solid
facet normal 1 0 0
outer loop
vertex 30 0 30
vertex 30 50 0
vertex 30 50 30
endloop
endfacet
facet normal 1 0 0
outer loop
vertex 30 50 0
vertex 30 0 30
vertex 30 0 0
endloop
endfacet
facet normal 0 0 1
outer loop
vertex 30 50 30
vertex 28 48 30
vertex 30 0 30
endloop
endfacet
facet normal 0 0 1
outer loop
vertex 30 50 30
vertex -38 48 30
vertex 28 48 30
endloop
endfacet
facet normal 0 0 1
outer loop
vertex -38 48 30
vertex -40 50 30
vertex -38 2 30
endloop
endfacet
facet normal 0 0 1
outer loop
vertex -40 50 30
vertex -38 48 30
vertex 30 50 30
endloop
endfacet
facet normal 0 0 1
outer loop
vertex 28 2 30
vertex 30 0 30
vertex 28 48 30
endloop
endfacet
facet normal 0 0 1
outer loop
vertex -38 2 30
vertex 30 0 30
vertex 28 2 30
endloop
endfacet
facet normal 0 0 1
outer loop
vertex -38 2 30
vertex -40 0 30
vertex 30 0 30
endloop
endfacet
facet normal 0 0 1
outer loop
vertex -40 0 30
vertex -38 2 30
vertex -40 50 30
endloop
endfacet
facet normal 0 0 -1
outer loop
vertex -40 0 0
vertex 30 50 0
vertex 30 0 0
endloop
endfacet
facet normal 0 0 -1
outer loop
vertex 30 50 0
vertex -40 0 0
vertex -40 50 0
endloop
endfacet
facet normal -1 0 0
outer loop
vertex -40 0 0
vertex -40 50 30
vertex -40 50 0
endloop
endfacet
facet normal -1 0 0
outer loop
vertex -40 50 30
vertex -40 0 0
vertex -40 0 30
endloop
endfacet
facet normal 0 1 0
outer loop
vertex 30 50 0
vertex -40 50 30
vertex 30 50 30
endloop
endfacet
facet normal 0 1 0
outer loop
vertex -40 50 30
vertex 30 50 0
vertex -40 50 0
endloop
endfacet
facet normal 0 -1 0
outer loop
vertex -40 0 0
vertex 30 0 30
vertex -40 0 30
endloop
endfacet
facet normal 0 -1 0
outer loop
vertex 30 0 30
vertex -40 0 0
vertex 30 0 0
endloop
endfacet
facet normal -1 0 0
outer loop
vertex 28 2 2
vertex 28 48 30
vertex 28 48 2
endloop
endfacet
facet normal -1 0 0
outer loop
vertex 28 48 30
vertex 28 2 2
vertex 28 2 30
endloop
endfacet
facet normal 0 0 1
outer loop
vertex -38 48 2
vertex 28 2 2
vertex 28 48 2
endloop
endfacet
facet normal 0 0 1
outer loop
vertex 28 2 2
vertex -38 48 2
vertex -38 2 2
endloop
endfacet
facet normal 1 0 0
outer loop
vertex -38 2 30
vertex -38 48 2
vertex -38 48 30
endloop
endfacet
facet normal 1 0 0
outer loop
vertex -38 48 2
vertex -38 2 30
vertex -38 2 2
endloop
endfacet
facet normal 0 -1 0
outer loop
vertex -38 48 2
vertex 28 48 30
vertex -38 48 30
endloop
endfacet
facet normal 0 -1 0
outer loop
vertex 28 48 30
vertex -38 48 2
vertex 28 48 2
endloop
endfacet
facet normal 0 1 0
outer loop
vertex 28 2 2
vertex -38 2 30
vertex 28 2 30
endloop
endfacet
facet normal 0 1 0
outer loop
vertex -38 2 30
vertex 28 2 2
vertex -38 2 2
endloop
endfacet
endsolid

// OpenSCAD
// Two-part enclosure for small electronics board
// Part 1: Box (Left)
// Part 2: Lid (Right, printed upside down as specified)
// Prints together with a 10mm gap between them.

// --- Dimensions ---
// Box Outer Dimensions (X x Y x Z)
$box_outer_x = 70;
$box_outer_y = 50;
$box_outer_z = 30;

// Wall and Floor Thickness
$wall_thickness = 2;
$floor_thickness = 2;

// Lid Dimensions
// Plate thickness
$plate_thickness = 2;
// Lip thickness
$lip_thickness = 1.5;
// Lip height (extends above plate)
$lip_height = 4; // Note: The prompt says "4 mm tall". 
                  // If the lip is a wall, does it mean the wall is 4mm high?
                  // Or the total height of the lip structure is 4mm?
                  // Given "1.5 mm thick wall, 4 mm tall", this usually means the wall height is 4mm.
                  // However, the previous prompt said "lip on top of it... 4mm tall".
                  // Let's re-read carefully: "a rectangular lip on top of it - a 1.5 mm thick wall, 4 mm tall".
                  // This implies the wall height is 4mm.
                  // BUT, the previous code used $lip_height = 4 and $lip_thickness = 1.5.
                  // If the wall is 4mm tall, the outer dimension of the lip would be Plate + 4 = 6mm.
                  // The prompt says "whose outer size is 65.6 x 45.6 mm". This refers to the footprint.
                  // It does not specify the total height of the lip structure, just the wall height.
                  // Wait, if the wall is 4mm tall, and it sits on a 2mm plate, the total height is 6mm.
                  // Let's assume the wall height is 4mm.
                  // However, looking at the previous code's variable names, I set $lip_height = 4.
                  // If I change the logic to a frame, the height of the frame is the critical dimension.
                  // Let's assume the "4 mm tall" refers to the wall height.
                  // So the lip structure is: Plate (2mm) + Wall (4mm) = 6mm total height.
                  // The footprint is 65.6 x 45.6.
                  // The hole inside the wall needs to match the box inner dimensions.
                  // Box Inner: 66 x 46.
                  // Lip Outer: 65.6 x 45.6.
                  // This means the Lip Outer is SMALLER than the Box Inner.
                  // This confirms the Lip is a frame that slides IN.
                  // The hole inside the lip must be smaller than the Lip Outer by the wall thickness (1.5mm).
                  // Lip Inner X = 65.6 - 1.5 = 64.1.
                  // Lip Inner Y = 45.6 - 1.5 = 44.1.
                  // Box Inner X = 66.
                  // Clearance = (66 - 64.1) / 2 = 0.95mm. This is a very tight fit but valid.
                  // Wait, the prompt said "0.2 mm clearance on each side".
                  // If Box Inner = 66, and Clearance = 0.2, then Lip Inner = 65.6.
                  // If Lip Inner = 65.6 and Lip Wall = 1.5, then Lip Outer = 65.6 + 1.5 + 1.5 = 68.6.
                  // But the prompt says "whose outer size is 65.6 x 45.6 mm".
                  // There is a contradiction in the prompt's numbers if we assume standard geometry.
                  // Let's re-read: "lip on top of it - a 1.5 mm thick wall, 4 mm tall, whose outer size is 65.6 x 45.6 mm".
                  // This explicitly defines the Outer Size of the lip as 65.6 x 45.6.
                  // And the Box Outer is 70 x 50. Wall 2mm. Box Inner = 66 x 46.
                  // If Lip Outer = 65.6, then Lip Inner = 65.6 - 1.5 - 1.5 = 62.6.
                  // Clearance = (66 - 62.6) / 2 = 1.7mm.
                  // The prompt says "0.2 mm clearance".
                  // This implies the user might have meant the *Inner* size of the lip is 65.6?
                  // Or the wall is thinner?
                  // Given the explicit "outer size is 65.6", I must follow that. The "0.2mm clearance" might be an approximation or based on a different wall thickness in the user's mind, but the dimensions are explicit.
                  // I will follow the explicit dimensions: Lip Outer = 65.6 x 45.6, Wall = 1.5.
                  // This results in a clearance of ~1.7mm, which is actually quite good for a slide-in fit.
                  // The "4 mm tall" refers to the wall height.

// Re-evaluating "4 mm tall":
// If the wall is 4mm tall, the lip structure is 2mm (plate) + 4mm (wall) = 6mm high.
// The previous code used $lip_height = 4. If I use that for the wall height, the total height is 6.
// Let's stick to the explicit numbers.

$lip_outer_x = 65.6;
$lip_outer_y = 45.6;
$lip_wall_thickness = 1.5;
$lip_wall_height = 4; // The wall is 4mm tall.

// Gap between parts
$gap_between_parts = 10;

// --- Configuration ---
$fn = 64; // Smooth curves

// --- Positioning ---
// Center the whole assembly on X=0.
// Box X center: -(gap + box/2)
// Lid X center: +(gap + box/2)
// Both centered on Y=0.

$box_x_pos = -($gap_between_parts/2 + $box_outer_x/2);
$box_y_pos = 0;
$box_z_pos = 0;

$lid_x_pos = $gap_between_parts/2 + $box_outer_x/2;
$lid_y_pos = 0;
$lid_z_pos = 0;

// --- Part 1: The Box ---
translate([
    $box_x_pos, 
    $box_y_pos, 
    $box_z_pos
])
difference() {
    // Outer Block
    cube([
        $box_outer_x, 
        $box_outer_y, 
        $box_outer_z
    ]);
    
    // Cut out the inside (open top)
    // Inner dimensions:
    // X: 70 - 2*2 = 66
    // Y: 50 - 2*2 = 46
    // Z: 30 - 2 (floor) = 28
    translate([
        $wall_thickness, 
        $wall_thickness, 
        $floor_thickness
    ])
    cube([
        $box_outer_x - (2 * $wall_thickness), 
        $box_outer_y - (2 * $wall_thickness), 
        $box_outer_z - $floor_thickness
    ]);
}

// --- Part 2: The Lid ---
// Structure:
// 1. Base Plate: 70 x 50 x 2
// 2. Lip Frame: Sits on top of the plate.
//    - Outer Footprint: 65.6 x 45.6
